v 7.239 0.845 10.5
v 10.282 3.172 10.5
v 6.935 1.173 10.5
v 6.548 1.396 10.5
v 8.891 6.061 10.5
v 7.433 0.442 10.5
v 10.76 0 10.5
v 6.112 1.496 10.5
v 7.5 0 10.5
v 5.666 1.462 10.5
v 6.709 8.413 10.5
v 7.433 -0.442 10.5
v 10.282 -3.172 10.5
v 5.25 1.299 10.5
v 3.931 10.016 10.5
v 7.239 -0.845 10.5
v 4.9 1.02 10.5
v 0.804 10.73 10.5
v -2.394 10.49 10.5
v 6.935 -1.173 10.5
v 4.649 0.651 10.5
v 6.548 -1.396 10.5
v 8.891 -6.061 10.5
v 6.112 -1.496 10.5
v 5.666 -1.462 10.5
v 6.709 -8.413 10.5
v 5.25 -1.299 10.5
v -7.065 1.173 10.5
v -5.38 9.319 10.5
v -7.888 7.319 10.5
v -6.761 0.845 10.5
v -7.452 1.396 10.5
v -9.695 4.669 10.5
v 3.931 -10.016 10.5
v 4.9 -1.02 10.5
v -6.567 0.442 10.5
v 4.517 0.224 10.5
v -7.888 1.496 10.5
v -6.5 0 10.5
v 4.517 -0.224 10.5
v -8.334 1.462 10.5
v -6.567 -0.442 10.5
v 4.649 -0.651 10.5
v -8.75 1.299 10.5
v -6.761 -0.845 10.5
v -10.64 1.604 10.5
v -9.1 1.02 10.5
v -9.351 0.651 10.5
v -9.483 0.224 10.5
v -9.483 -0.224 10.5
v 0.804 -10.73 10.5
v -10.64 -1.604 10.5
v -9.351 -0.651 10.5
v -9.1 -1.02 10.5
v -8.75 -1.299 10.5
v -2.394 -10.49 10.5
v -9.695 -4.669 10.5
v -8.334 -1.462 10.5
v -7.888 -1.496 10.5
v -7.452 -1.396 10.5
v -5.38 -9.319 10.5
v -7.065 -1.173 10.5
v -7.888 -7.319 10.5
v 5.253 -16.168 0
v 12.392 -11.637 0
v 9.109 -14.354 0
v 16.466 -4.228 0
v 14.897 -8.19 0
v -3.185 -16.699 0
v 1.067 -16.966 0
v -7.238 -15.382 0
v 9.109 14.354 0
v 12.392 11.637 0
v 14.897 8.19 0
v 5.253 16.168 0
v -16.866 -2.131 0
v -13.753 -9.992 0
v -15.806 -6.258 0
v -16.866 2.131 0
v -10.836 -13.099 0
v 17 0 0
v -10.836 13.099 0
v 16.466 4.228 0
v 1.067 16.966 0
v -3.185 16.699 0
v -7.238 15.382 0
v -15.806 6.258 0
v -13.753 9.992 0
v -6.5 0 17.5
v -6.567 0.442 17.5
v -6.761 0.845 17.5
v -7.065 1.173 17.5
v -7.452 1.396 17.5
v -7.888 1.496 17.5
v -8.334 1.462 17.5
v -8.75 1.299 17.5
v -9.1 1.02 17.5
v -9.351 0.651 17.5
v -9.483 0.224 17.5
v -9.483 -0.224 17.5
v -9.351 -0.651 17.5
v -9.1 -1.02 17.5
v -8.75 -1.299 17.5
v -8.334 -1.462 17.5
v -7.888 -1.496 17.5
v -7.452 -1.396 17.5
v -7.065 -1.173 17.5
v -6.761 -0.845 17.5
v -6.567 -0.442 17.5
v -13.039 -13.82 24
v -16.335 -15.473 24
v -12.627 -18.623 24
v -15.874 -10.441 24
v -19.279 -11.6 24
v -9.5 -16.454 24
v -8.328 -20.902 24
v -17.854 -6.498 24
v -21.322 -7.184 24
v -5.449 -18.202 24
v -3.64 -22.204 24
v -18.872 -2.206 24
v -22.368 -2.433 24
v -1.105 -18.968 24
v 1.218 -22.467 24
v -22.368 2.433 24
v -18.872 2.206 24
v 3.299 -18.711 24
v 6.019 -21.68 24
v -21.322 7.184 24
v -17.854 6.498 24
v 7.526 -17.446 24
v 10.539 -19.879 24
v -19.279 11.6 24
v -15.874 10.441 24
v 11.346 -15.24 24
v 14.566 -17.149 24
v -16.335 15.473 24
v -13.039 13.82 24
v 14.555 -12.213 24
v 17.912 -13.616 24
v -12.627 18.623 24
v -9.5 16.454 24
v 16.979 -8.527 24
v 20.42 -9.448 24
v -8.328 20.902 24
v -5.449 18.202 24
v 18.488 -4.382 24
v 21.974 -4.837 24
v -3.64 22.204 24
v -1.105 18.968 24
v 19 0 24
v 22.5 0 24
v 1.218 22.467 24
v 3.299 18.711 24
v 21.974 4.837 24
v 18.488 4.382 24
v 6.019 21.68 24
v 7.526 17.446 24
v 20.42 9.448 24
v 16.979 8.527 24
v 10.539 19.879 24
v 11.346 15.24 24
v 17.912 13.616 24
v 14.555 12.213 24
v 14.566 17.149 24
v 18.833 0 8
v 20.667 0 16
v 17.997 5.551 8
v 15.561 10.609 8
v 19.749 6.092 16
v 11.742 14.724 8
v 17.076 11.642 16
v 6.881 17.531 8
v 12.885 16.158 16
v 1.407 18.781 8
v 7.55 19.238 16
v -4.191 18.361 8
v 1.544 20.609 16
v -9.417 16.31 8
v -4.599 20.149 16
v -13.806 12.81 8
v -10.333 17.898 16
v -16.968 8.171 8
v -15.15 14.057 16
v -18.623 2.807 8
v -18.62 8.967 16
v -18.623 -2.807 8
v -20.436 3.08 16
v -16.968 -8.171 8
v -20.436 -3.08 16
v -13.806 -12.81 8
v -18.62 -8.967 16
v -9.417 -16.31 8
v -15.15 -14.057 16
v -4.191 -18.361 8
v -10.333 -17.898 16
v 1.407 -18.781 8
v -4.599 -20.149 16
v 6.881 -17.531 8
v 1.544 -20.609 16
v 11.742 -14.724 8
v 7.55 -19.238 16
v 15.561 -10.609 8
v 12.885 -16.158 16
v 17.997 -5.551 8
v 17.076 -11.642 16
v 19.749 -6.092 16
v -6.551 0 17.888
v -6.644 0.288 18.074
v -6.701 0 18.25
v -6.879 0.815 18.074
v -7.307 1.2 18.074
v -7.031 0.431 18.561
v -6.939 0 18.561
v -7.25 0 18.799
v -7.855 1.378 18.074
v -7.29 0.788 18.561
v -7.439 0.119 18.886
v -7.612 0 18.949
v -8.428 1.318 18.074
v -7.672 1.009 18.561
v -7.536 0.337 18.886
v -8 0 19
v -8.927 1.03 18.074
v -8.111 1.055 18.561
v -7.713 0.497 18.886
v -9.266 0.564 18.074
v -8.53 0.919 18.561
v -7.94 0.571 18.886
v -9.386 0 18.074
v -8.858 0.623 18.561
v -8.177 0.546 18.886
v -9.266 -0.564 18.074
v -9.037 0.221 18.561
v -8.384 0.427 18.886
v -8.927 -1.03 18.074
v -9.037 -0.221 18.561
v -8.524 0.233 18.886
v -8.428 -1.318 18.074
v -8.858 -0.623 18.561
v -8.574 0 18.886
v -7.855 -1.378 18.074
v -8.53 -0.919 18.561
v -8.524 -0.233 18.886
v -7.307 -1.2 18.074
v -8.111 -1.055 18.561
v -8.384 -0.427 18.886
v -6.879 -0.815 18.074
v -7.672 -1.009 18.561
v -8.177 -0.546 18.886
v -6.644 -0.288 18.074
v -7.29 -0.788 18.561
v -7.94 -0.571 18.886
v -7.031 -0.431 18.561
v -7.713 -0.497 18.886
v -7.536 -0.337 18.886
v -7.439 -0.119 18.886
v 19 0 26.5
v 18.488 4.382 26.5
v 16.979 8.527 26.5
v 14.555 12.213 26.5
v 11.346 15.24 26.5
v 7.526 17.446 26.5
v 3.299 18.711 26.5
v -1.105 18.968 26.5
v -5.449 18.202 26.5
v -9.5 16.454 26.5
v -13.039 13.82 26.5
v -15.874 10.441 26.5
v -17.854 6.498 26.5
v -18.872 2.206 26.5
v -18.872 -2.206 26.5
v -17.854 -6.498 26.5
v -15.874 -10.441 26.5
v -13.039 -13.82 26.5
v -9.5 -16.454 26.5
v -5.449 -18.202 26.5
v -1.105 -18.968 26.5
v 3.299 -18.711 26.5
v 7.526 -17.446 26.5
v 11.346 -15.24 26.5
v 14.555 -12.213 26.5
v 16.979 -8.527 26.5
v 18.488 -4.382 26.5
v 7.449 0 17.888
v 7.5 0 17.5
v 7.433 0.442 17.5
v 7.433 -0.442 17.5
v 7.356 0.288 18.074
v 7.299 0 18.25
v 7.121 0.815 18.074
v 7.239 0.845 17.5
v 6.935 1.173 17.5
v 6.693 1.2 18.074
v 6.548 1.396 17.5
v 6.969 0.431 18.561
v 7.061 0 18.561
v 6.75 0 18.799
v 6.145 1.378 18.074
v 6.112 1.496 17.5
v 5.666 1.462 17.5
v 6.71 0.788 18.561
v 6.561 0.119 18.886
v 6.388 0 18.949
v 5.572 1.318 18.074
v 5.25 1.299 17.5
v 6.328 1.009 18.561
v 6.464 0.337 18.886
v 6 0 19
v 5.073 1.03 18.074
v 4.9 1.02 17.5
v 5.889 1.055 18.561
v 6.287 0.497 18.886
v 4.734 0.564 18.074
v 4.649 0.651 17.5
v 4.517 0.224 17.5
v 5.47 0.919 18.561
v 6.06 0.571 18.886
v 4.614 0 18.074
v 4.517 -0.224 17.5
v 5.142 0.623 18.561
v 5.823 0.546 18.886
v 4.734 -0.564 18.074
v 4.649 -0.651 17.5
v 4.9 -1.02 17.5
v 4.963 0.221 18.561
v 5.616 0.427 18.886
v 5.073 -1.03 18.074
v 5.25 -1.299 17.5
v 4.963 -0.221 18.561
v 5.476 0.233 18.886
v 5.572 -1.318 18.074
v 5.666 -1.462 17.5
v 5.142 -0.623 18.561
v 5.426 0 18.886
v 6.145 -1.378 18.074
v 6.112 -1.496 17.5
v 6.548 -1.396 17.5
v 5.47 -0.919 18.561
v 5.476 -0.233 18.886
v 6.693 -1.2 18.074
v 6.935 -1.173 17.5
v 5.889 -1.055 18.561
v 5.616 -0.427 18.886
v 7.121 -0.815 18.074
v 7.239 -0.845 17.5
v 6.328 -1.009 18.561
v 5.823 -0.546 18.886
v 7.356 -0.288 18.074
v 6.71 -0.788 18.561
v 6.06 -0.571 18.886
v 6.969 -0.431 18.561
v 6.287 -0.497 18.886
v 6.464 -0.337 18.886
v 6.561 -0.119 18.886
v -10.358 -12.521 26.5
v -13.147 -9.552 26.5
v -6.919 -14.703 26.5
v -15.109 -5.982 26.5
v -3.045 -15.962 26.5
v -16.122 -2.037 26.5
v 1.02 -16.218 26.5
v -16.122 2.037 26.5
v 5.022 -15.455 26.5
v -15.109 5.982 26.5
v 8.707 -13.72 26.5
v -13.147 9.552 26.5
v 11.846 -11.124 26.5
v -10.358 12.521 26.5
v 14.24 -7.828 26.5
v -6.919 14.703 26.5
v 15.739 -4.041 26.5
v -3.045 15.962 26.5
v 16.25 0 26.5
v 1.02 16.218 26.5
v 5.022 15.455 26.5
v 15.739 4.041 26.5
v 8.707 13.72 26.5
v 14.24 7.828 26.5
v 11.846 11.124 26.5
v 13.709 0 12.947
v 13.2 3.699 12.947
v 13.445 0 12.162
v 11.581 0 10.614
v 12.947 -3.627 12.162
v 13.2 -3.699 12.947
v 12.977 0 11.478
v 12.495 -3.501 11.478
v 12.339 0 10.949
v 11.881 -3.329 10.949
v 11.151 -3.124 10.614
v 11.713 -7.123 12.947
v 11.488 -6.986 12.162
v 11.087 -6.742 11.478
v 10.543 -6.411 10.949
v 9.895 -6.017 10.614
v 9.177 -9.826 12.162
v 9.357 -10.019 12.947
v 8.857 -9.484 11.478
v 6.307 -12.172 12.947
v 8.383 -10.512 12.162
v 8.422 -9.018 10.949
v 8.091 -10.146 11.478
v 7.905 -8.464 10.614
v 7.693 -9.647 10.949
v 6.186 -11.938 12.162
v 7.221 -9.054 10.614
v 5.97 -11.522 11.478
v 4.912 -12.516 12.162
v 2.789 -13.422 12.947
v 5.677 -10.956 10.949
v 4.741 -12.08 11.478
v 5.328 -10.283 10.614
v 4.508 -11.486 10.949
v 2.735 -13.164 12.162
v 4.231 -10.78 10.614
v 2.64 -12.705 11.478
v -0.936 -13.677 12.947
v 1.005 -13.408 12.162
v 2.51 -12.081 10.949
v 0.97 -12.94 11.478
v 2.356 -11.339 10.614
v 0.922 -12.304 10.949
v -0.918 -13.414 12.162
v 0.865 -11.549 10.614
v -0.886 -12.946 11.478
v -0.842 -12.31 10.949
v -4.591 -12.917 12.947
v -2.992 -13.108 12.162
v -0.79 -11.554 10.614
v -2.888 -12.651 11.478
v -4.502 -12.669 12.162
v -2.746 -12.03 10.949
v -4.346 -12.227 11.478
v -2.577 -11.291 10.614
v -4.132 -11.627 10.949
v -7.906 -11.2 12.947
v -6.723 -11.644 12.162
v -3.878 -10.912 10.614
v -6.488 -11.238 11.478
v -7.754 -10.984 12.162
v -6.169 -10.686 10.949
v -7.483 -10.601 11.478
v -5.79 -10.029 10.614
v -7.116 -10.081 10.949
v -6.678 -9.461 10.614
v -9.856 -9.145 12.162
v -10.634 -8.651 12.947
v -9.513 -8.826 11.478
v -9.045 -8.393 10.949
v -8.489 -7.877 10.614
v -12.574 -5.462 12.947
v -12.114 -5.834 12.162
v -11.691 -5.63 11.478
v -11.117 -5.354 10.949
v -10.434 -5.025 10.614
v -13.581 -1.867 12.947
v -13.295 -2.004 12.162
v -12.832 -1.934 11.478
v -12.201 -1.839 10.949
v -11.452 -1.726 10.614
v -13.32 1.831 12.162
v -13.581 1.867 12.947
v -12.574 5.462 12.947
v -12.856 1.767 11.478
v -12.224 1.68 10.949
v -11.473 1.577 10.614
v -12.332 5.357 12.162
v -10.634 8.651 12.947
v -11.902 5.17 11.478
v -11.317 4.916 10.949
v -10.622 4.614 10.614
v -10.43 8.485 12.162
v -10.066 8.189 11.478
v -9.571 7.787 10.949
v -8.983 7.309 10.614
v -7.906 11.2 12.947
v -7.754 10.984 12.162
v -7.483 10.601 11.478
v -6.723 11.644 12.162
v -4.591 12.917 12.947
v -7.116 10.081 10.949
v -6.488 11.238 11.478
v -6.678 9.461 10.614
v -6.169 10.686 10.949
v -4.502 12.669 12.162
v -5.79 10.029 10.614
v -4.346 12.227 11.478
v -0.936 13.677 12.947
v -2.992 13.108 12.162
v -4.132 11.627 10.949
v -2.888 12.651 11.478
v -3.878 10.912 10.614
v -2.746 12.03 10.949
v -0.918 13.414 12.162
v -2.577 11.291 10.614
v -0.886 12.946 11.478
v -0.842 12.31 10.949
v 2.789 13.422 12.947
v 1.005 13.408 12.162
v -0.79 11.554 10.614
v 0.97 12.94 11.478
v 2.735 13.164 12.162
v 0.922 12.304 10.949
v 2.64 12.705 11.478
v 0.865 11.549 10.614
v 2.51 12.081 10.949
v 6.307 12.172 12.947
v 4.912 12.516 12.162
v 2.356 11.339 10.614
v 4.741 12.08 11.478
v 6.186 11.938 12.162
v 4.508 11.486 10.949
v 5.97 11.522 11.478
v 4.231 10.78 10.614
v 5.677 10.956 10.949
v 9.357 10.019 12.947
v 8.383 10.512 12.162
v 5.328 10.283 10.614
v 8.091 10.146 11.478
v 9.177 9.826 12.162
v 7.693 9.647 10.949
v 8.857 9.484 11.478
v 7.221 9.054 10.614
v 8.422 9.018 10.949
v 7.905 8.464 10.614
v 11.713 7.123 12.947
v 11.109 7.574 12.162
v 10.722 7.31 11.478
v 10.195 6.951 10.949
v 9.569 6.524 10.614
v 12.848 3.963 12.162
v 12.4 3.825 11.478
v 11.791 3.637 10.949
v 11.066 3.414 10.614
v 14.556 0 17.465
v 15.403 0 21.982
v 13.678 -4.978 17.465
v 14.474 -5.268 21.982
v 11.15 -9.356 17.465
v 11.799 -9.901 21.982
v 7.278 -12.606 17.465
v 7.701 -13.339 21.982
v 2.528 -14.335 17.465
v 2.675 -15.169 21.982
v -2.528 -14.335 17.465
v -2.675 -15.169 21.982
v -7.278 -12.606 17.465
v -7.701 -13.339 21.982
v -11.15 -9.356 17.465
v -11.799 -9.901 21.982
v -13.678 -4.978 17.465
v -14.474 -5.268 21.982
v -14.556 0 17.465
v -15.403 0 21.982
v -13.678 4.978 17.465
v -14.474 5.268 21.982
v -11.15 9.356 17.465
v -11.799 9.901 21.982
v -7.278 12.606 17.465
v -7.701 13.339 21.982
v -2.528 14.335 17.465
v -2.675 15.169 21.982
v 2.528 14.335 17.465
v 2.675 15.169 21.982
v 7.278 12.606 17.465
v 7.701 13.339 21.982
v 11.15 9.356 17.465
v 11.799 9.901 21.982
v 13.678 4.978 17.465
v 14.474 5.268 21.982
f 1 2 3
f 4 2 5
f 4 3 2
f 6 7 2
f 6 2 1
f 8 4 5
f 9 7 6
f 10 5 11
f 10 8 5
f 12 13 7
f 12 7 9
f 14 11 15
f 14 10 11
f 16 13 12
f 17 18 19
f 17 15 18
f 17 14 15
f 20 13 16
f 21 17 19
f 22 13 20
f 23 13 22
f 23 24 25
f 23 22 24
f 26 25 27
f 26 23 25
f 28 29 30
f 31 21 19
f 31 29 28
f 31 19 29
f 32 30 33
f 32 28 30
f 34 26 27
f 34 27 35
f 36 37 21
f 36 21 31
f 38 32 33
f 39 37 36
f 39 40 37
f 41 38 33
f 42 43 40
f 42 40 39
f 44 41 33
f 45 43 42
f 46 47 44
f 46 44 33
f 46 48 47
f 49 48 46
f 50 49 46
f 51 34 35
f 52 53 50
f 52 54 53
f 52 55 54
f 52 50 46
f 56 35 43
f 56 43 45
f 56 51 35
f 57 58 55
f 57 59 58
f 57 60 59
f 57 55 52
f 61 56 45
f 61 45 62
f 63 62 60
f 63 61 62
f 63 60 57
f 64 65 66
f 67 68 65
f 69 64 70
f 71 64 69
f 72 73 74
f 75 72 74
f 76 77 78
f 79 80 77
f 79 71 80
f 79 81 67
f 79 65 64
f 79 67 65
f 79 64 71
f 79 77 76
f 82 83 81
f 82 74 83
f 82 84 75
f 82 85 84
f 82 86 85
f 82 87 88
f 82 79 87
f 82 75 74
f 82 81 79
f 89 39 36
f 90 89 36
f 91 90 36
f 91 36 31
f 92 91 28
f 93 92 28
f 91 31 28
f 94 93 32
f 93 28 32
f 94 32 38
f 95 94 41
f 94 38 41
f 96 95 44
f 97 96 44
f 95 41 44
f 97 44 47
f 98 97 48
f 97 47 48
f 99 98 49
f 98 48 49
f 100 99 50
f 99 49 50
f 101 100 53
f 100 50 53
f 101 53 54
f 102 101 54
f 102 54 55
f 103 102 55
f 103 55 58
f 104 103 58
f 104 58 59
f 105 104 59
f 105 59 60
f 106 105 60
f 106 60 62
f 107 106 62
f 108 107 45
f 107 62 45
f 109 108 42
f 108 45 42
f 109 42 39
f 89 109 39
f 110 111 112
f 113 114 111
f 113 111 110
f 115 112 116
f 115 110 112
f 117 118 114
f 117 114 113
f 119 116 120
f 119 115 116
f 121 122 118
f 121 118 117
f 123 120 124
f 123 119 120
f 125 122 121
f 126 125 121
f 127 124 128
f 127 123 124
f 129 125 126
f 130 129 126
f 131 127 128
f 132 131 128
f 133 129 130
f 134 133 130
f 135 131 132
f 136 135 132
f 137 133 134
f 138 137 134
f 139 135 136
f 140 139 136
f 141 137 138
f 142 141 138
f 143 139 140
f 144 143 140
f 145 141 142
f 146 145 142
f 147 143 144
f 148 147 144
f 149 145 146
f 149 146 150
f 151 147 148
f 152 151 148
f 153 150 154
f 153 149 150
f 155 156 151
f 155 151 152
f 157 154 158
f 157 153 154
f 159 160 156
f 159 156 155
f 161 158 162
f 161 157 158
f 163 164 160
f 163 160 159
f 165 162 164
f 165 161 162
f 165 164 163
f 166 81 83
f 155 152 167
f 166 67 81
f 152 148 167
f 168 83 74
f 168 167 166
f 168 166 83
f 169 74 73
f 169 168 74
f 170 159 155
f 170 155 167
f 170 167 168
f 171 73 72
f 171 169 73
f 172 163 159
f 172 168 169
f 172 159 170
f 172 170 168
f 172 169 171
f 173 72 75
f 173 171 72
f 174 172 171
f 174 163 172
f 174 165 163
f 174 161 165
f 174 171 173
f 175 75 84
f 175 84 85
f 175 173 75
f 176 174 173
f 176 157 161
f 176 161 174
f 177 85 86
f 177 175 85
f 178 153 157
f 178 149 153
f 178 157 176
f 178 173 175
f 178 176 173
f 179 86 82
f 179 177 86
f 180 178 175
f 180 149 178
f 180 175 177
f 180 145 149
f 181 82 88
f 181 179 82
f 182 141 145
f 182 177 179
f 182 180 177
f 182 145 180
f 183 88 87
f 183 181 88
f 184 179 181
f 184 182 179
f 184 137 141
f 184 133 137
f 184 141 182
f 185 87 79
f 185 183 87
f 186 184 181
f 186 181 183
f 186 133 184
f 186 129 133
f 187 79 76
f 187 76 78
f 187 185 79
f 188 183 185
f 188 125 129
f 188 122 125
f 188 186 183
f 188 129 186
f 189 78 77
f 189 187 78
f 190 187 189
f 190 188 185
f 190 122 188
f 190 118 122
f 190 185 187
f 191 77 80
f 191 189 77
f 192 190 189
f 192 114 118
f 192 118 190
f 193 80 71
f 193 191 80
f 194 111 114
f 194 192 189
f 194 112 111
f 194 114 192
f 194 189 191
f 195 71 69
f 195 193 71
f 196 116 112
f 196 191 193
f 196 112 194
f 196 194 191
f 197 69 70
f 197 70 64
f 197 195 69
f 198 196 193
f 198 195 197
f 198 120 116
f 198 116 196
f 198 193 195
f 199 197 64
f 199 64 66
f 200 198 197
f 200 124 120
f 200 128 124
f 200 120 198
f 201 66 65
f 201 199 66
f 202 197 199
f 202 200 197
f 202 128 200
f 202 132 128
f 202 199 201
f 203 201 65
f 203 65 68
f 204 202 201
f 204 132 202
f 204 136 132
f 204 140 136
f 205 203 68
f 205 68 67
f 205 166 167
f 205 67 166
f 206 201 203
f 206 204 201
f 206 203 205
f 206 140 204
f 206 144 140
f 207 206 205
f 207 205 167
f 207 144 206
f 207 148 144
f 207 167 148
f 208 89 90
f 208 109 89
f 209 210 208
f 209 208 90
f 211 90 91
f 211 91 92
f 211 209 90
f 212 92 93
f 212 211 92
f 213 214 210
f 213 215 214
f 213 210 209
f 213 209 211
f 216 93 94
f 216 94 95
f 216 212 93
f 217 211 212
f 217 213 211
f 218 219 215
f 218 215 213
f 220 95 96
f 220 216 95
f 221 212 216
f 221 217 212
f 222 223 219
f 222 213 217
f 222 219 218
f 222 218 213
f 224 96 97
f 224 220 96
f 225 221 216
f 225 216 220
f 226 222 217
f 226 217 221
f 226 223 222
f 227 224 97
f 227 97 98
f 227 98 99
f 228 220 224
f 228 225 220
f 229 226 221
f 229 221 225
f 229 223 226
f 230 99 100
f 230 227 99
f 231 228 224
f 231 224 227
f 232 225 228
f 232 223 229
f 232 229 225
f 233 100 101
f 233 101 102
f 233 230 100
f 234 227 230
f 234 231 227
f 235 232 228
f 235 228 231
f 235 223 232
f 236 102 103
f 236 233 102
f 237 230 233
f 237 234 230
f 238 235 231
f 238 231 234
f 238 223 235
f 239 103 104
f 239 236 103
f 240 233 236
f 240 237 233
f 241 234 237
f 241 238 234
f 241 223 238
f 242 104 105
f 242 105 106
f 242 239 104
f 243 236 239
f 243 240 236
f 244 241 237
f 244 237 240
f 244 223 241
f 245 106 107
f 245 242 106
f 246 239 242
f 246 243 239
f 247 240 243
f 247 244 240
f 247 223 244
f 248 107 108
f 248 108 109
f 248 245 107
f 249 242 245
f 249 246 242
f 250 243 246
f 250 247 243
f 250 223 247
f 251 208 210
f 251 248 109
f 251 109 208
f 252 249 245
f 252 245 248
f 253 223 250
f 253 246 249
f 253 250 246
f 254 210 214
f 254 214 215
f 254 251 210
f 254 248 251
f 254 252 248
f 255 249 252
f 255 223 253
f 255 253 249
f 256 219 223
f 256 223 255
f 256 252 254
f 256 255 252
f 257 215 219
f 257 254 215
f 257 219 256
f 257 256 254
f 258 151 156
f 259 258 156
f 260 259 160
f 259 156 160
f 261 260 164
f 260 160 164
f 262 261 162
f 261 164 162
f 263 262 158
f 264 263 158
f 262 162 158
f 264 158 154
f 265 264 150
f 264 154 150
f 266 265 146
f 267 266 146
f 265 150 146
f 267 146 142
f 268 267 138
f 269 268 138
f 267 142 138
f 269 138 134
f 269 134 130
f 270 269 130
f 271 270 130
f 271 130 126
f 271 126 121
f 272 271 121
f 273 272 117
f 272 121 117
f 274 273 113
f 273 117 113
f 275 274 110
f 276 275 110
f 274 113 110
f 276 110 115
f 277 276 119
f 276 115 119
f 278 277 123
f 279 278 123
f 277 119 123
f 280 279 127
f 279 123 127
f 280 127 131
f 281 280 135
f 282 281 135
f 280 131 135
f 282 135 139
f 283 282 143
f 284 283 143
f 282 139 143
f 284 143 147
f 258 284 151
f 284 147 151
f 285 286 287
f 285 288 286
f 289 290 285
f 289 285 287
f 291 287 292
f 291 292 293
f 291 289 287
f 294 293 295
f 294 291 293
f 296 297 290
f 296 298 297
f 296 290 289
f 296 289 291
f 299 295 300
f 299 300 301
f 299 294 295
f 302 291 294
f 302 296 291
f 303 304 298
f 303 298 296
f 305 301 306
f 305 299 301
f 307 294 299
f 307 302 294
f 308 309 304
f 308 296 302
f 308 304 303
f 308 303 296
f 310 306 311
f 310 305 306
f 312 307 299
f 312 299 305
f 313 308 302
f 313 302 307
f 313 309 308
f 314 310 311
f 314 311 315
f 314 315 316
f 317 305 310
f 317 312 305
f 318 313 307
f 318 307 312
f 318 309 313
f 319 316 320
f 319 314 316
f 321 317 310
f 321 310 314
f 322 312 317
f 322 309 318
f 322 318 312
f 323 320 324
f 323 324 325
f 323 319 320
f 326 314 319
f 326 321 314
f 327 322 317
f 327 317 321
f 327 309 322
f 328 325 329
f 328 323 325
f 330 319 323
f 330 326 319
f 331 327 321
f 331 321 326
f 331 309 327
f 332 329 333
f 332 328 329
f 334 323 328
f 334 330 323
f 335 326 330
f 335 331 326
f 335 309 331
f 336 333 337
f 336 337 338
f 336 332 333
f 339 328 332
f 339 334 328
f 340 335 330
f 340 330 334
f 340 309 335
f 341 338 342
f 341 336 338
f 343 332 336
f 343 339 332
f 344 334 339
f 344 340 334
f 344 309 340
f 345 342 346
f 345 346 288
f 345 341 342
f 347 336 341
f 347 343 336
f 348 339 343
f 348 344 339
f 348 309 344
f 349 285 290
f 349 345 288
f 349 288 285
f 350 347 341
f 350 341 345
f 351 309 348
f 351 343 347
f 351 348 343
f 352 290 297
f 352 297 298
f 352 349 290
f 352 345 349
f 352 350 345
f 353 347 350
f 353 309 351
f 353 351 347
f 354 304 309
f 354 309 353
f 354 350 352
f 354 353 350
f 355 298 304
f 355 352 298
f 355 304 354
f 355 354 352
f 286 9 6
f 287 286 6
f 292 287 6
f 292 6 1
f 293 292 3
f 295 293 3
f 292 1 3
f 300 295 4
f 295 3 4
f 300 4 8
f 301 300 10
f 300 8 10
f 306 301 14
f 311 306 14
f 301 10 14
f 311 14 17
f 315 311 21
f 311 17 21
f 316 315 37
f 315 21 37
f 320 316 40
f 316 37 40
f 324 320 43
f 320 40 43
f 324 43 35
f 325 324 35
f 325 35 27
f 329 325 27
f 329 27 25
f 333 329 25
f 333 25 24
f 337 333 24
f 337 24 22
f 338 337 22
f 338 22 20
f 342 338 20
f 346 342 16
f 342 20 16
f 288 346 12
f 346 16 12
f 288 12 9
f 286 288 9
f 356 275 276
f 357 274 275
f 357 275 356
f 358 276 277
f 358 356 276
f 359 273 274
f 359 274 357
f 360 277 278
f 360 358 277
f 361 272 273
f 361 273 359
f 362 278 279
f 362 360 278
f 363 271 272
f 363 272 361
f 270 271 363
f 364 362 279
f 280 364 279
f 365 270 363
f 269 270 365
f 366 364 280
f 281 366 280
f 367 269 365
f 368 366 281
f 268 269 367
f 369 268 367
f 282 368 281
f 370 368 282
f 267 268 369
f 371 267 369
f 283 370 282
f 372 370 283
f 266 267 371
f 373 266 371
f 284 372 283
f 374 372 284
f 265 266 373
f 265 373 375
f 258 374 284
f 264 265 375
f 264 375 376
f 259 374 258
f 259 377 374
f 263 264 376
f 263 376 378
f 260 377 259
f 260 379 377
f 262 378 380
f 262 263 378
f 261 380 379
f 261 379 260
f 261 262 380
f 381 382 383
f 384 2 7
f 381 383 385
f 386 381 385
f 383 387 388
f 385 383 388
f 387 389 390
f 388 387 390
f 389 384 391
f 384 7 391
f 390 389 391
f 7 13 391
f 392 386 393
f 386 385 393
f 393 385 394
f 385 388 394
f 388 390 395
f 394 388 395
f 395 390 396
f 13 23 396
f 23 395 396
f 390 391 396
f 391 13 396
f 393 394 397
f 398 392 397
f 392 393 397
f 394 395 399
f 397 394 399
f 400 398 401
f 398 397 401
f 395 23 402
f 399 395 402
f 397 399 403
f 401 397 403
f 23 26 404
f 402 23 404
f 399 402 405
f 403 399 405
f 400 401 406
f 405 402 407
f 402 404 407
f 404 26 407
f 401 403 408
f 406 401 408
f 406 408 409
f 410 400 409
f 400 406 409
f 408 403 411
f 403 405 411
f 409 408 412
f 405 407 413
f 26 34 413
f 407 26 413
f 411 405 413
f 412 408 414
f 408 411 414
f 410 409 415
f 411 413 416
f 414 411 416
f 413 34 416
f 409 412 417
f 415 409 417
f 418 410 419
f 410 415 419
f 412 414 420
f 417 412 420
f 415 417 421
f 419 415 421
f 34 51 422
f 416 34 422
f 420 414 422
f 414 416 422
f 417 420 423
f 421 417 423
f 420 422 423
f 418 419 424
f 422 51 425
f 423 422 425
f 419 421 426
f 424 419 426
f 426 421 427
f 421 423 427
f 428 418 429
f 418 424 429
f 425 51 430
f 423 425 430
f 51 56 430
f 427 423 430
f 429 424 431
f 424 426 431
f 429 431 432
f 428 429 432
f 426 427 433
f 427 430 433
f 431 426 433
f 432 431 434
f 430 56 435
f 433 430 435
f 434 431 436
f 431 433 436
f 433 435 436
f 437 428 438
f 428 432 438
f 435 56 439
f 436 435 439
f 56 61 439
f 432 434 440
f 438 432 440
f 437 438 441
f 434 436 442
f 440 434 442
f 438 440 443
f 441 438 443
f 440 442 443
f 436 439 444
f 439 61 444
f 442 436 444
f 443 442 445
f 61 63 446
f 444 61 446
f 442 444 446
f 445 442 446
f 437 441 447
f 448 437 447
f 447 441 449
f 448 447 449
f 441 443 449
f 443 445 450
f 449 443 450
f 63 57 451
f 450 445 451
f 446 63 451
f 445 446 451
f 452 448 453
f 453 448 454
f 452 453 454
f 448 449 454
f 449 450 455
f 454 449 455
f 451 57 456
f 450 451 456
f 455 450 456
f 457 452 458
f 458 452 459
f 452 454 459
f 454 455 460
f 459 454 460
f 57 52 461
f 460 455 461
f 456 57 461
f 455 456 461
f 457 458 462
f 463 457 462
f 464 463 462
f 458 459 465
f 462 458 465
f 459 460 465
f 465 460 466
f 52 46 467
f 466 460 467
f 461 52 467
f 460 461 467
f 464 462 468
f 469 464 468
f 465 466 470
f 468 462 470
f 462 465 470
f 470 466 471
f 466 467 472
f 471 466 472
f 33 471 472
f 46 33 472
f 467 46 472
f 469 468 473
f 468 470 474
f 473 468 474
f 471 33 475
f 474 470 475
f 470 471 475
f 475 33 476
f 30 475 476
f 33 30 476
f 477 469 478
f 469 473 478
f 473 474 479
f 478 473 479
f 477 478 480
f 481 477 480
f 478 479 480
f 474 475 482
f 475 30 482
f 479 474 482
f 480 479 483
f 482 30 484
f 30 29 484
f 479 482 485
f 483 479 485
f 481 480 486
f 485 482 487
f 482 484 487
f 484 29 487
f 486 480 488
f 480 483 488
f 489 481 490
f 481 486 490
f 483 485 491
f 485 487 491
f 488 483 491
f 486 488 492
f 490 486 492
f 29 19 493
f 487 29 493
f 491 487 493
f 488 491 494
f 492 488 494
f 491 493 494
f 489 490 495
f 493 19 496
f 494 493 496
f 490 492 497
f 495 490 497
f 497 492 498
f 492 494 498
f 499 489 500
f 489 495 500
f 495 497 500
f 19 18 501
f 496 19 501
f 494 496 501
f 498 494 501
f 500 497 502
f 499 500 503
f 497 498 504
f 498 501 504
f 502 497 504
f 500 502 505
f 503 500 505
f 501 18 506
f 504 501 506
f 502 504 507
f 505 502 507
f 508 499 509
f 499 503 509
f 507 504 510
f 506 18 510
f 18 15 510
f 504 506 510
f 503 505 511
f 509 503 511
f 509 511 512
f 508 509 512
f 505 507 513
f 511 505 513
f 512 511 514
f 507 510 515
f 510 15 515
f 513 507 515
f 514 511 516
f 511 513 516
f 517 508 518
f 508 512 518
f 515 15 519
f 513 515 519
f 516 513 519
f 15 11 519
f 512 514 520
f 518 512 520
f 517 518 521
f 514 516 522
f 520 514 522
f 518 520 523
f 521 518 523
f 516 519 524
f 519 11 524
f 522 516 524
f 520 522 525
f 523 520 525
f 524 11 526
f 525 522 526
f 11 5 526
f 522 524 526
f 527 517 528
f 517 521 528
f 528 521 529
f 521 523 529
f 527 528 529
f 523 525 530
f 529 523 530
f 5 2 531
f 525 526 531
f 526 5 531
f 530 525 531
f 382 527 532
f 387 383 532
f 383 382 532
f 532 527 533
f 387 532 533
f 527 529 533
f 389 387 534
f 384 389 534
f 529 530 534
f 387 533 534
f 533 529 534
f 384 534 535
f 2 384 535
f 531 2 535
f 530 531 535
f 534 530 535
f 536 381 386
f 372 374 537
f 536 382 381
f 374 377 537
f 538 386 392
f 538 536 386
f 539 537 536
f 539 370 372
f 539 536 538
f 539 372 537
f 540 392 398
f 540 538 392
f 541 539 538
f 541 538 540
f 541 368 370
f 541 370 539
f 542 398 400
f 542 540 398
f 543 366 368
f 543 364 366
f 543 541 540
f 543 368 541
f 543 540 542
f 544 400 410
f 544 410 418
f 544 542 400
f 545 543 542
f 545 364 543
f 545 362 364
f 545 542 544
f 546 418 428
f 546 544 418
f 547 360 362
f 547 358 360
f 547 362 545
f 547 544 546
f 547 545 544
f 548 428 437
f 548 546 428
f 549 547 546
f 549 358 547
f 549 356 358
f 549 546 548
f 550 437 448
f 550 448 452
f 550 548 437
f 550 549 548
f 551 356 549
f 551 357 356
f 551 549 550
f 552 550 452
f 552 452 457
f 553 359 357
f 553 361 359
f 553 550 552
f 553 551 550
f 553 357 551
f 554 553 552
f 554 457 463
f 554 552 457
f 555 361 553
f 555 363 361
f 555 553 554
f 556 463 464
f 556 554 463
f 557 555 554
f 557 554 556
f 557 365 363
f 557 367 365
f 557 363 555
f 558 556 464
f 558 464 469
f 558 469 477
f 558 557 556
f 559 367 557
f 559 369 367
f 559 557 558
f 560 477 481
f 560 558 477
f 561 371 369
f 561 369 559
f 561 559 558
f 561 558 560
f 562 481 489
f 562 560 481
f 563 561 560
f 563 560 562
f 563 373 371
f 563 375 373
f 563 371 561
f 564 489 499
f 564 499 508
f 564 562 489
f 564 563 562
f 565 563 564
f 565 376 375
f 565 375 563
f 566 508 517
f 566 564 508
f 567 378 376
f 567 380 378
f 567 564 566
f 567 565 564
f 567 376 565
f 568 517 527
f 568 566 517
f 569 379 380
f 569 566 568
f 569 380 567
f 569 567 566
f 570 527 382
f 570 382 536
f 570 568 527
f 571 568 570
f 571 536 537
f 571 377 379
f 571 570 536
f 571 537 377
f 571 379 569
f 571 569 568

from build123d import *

# Parameters (mm, degrees)
F2_R     = 19
F3_DEPTH = 2.5
F6_R     = 3
F7_R     = 1.5
F8_DEPTH = 8.5
F9_R     = 1.5


with BuildPart() as f1:
    # F0 (on Front) → F1 (revolve)
    with BuildSketch(Plane.XZ):
        Polygon((0, 24), (0, 0), (17, 0), (22.5, 24), align=None)
    revolve(axis=Axis((0, 0, 12), (0, 0, 1)))

    # F2 (on face) → F3 (join)
    with BuildSketch(Plane.XY.offset(24)):
        Circle(F2_R)
    extrude(amount=F3_DEPTH)

    # F4 (on Front) → F5 (revolve, cut)
    with BuildSketch(Plane.XZ):
        Polygon((16.25, 26.5), (0, 26.5), (0, 10.5), (13.25, 10.5), align=None)
    revolve(axis=Axis((0, 0, 18.5), (0, 0, -1)), mode=Mode.SUBTRACT)

    # F6
    f6_edges = [f1.edges().sort_by_distance(p)[0] for p in [
        (-13.25, 0, 10.5),
    ]]
    fillet(f6_edges, radius=F6_R)

    # F7 (on face) → F8 (join)
    with BuildSketch(Plane.XY.offset(10.5)):
        with Locations((-8, 0)):
            Circle(F7_R)
        with Locations((6, 0)):
            Circle(F7_R)
    extrude(amount=F8_DEPTH)

    # F9
    f9_edges = [f1.edges().sort_by_distance(p)[0] for p in [
        (-9.5, 0, 19),
        (4.5, 0, 19),
    ]]
    fillet(f9_edges, radius=F9_R)


solid = f1.part
